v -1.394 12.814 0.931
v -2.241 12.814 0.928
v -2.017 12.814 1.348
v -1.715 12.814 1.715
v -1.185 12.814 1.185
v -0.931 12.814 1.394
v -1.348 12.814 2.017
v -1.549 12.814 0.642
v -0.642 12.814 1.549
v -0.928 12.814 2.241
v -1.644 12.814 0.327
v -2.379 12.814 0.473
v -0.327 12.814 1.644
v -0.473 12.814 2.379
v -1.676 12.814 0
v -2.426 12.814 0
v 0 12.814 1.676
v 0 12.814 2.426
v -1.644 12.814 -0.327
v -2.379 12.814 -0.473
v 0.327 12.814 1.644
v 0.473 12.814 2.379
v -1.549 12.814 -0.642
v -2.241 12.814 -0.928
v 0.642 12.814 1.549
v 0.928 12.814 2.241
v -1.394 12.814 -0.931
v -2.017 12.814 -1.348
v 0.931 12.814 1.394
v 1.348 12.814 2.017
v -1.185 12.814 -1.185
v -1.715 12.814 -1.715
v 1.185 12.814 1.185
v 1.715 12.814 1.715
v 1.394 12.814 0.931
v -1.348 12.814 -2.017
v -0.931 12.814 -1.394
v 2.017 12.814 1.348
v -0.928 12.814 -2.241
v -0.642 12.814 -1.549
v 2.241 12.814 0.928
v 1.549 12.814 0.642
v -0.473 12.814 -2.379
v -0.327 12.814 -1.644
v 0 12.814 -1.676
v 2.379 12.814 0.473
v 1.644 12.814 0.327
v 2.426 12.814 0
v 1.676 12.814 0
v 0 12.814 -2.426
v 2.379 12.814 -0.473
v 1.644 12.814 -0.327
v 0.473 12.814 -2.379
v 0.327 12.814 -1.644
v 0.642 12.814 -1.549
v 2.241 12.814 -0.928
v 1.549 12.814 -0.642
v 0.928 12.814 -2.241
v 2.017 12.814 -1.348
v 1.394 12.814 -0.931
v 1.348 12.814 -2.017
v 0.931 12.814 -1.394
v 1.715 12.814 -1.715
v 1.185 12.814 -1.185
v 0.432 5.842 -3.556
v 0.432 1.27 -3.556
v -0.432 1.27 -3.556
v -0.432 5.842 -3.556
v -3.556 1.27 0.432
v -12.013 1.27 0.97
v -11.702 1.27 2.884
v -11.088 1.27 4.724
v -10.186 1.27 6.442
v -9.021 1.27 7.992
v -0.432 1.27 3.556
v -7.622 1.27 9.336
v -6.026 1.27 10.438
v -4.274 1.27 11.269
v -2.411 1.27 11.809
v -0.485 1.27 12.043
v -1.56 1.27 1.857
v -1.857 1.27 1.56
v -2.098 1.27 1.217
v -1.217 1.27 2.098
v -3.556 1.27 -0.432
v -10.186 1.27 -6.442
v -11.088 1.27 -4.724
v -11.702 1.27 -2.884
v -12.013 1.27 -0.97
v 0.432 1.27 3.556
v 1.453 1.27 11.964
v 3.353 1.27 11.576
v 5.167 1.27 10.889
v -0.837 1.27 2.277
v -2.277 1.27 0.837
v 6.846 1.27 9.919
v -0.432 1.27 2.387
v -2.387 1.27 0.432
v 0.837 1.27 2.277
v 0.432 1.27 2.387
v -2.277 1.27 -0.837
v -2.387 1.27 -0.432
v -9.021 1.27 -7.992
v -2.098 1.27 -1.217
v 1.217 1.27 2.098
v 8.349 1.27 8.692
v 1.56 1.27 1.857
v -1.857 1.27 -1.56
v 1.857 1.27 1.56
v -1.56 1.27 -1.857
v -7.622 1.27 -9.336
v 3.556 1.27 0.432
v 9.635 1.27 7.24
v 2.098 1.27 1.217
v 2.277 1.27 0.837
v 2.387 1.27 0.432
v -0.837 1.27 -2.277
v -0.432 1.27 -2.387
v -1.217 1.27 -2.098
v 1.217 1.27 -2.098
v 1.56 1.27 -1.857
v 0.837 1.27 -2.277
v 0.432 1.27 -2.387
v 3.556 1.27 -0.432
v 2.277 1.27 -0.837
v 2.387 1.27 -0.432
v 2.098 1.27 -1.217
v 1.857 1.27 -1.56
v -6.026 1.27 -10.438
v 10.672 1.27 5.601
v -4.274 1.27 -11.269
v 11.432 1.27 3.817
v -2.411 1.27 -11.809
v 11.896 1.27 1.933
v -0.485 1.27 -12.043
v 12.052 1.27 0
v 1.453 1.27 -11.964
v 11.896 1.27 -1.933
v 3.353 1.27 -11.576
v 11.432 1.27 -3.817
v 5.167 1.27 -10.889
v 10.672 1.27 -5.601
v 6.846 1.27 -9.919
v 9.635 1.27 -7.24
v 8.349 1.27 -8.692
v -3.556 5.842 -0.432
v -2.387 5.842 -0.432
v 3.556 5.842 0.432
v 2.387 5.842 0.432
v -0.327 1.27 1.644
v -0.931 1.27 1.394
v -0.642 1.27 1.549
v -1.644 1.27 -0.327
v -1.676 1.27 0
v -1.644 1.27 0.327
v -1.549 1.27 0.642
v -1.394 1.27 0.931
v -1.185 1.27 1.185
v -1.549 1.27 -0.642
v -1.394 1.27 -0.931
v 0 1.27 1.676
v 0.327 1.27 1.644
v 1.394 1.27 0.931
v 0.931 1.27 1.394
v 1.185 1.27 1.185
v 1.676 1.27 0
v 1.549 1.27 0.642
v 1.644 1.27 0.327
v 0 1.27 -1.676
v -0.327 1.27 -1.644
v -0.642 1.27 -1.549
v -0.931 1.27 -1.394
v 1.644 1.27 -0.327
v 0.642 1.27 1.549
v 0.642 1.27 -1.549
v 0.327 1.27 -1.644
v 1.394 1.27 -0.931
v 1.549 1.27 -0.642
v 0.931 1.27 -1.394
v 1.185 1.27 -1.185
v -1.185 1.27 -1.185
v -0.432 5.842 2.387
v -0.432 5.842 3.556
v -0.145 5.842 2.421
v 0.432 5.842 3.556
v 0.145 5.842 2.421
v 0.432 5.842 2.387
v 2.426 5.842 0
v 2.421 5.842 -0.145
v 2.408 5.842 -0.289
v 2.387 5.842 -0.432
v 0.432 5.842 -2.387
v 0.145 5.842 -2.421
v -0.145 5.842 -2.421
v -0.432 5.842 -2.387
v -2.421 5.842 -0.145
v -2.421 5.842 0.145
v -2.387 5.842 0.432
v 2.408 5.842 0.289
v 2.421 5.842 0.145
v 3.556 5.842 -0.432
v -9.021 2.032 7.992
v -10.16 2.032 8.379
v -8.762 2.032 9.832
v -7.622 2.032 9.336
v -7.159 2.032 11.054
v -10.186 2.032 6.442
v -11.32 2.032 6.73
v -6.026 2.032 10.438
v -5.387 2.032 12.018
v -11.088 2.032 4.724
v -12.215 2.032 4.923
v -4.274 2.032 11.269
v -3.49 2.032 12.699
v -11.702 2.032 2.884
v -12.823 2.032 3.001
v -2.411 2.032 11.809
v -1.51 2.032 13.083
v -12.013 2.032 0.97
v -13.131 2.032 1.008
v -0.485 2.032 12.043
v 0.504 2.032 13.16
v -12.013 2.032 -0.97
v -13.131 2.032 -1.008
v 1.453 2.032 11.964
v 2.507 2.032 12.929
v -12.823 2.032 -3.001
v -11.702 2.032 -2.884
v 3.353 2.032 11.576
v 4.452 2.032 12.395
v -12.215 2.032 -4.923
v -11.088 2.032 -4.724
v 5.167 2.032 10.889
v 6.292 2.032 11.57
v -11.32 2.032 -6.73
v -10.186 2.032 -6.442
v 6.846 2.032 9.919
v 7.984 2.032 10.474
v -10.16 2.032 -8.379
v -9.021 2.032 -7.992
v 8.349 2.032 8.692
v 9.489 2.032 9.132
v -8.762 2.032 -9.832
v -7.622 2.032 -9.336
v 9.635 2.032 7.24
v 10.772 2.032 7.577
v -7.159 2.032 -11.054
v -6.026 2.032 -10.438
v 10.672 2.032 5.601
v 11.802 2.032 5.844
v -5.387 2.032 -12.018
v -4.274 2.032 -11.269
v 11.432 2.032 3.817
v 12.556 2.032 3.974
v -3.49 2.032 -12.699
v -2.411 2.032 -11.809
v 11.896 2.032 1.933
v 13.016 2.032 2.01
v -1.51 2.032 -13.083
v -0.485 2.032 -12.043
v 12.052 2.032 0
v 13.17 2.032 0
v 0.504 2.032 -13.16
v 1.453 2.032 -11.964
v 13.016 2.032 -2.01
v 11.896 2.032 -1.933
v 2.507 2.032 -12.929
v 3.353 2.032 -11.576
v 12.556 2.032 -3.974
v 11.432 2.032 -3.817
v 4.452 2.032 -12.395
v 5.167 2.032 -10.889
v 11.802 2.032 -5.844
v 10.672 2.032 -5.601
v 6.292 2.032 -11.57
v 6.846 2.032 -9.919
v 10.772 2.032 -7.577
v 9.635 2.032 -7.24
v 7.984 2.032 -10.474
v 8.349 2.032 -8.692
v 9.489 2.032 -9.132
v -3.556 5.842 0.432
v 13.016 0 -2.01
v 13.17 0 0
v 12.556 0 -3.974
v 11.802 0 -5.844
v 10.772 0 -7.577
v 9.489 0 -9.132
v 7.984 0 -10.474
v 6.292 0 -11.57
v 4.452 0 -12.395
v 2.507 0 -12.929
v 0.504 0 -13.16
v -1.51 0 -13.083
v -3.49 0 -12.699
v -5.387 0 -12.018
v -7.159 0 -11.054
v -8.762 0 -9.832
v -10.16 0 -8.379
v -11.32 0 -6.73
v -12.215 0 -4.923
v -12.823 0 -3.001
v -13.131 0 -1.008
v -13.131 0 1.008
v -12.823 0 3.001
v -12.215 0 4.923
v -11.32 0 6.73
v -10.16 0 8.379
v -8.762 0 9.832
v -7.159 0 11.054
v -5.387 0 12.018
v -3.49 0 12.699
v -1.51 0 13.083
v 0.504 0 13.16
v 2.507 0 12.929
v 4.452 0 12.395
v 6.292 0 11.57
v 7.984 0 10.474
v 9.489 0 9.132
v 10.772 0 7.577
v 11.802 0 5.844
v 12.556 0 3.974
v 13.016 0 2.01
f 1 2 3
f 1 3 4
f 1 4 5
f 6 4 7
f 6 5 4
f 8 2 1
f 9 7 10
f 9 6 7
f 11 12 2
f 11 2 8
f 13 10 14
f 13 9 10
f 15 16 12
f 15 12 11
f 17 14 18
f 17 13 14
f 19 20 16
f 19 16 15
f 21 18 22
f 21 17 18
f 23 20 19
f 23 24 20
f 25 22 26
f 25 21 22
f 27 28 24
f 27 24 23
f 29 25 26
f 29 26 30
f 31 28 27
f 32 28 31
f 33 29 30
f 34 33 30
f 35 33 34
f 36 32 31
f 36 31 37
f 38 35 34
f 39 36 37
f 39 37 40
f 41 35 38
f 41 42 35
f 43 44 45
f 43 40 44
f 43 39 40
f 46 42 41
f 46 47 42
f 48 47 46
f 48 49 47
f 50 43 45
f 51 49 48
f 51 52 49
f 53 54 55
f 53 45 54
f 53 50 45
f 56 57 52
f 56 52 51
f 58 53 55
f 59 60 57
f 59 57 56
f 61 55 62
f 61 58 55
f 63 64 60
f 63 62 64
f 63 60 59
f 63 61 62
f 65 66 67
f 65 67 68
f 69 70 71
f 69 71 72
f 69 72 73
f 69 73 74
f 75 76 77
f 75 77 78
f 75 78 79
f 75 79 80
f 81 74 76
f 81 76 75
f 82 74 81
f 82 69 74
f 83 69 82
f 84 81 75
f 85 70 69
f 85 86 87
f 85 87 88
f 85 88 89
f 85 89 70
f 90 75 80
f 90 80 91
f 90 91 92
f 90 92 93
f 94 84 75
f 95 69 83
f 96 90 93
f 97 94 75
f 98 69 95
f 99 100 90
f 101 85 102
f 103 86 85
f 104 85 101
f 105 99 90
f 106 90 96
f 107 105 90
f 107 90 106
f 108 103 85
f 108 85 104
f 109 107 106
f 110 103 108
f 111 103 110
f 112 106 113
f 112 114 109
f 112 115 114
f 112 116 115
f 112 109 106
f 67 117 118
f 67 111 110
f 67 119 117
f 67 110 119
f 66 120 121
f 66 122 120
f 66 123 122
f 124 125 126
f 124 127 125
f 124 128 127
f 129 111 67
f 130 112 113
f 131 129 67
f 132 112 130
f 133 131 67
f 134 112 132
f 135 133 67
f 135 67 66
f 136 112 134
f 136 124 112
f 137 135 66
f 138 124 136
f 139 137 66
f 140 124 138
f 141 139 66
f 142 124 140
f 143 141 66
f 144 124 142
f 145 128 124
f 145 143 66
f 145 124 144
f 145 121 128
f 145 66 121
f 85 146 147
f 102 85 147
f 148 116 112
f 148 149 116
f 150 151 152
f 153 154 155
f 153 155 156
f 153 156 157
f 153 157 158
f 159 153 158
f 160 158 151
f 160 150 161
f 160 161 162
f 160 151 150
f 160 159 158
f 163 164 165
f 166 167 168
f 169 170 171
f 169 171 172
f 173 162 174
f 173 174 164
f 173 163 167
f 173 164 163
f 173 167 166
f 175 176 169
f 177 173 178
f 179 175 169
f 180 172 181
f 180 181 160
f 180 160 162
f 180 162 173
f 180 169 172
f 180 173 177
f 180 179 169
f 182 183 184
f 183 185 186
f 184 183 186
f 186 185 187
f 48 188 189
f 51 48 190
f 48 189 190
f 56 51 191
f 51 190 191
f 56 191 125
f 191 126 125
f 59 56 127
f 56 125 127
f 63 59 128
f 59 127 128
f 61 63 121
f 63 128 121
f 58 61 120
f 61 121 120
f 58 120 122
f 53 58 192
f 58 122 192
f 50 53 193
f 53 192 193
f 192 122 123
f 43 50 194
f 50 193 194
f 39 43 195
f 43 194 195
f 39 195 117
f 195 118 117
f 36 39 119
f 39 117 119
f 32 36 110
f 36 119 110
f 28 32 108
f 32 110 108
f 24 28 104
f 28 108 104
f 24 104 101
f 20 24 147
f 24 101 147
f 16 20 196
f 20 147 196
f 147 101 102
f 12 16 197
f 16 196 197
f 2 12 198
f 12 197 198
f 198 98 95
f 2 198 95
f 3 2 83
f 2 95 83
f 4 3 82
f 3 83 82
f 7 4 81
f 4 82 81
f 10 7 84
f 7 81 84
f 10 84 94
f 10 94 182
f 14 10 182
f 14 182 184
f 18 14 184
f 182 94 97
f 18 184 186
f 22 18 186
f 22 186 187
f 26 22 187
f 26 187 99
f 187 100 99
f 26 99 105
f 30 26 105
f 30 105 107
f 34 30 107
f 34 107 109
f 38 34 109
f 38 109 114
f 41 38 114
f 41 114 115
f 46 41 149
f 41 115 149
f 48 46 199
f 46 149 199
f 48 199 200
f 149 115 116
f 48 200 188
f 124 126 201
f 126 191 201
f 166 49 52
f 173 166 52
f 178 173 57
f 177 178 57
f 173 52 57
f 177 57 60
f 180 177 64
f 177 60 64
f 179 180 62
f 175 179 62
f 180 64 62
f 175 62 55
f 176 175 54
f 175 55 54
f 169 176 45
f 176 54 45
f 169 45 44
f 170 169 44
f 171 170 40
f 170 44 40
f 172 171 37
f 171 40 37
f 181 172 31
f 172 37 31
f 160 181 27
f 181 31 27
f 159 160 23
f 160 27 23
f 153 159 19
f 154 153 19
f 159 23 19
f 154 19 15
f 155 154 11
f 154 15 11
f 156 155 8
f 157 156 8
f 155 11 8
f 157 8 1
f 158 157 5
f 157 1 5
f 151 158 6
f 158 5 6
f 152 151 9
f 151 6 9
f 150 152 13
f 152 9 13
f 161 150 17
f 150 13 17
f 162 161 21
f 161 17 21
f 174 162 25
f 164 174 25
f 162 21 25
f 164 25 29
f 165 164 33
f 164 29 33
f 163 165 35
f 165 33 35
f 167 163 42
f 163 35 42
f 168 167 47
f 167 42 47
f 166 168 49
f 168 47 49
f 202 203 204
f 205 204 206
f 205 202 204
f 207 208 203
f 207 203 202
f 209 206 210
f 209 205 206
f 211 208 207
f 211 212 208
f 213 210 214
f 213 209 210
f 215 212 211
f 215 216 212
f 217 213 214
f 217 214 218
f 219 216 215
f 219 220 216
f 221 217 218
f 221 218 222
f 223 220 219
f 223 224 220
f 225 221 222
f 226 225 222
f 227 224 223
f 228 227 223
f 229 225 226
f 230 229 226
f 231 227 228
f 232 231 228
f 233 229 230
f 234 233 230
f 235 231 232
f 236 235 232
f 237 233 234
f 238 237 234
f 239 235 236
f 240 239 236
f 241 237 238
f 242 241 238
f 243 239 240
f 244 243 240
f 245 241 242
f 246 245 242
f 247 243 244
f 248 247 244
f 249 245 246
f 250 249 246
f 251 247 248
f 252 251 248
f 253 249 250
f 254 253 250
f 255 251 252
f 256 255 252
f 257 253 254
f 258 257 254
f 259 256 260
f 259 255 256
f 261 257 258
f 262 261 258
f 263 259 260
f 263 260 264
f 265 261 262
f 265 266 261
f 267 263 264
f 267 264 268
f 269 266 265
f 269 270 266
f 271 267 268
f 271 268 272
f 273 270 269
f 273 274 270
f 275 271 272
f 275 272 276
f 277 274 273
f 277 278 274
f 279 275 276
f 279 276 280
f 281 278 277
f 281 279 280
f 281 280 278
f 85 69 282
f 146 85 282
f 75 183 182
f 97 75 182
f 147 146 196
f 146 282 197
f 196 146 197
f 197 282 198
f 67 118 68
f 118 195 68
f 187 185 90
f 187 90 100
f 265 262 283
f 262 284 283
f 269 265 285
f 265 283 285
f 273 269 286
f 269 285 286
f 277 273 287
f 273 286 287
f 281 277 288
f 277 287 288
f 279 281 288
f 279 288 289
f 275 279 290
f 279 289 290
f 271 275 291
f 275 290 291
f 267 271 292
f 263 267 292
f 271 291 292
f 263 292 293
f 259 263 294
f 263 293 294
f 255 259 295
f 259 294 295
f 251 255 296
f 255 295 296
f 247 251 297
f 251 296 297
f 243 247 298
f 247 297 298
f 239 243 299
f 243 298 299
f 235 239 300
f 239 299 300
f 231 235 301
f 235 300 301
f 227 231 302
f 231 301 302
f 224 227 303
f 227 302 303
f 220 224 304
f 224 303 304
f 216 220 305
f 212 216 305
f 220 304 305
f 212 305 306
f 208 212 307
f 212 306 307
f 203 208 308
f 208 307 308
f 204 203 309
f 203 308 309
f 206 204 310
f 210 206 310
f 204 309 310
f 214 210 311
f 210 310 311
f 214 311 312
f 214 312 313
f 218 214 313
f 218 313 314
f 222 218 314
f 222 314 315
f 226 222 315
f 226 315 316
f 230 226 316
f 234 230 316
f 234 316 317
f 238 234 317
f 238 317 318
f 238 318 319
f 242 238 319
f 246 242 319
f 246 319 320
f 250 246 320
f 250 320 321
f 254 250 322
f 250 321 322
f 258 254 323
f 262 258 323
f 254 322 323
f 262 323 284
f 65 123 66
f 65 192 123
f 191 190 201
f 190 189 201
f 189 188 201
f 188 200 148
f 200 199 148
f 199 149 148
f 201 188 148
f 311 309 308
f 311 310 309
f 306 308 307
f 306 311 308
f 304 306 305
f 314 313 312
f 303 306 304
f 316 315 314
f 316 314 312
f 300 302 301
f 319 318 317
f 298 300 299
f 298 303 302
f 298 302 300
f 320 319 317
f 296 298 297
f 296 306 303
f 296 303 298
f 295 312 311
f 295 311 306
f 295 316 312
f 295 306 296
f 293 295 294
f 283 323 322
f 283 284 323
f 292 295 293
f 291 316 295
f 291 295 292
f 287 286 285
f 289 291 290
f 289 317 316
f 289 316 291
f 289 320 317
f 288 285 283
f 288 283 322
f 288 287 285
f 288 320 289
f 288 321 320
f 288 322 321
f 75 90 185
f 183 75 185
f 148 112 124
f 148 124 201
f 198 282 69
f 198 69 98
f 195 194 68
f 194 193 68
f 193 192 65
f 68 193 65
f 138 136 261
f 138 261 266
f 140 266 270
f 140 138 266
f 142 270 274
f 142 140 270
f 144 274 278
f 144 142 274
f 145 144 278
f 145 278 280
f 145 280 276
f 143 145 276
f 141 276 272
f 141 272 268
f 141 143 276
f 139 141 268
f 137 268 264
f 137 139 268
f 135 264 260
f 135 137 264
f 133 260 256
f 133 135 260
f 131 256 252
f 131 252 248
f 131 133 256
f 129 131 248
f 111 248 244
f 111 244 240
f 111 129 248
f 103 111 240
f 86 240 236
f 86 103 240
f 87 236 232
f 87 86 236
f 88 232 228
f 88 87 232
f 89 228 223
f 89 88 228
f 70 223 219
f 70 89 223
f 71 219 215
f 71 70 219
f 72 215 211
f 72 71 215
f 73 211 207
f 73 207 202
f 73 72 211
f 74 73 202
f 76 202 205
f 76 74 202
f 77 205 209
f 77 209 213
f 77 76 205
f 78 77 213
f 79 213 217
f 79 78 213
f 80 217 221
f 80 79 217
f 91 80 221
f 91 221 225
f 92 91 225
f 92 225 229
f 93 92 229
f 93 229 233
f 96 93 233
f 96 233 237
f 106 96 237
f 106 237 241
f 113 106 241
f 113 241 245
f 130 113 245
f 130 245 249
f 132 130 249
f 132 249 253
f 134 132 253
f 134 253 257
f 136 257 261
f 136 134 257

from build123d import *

# Parameters (mm, degrees)
SKETCH1_R           = 13.1699
BOSS_EXTRUDE1_DEPTH = 1.27
SKETCH2_R           = 13.1699
SKETCH2_R_2         = 12.0523
BOSS_EXTRUDE2_DEPTH = 0.762
SKETCH3_R           = 2.4257
BOSS_EXTRUDE3_DEPTH = 11.5443
SKETCH6_W           = 7.112
SKETCH6_H           = 5.842
BOSS_EXTRUDE4_DEPTH = 0.4318
SKETCH7_W           = 7.112
SKETCH7_H           = 5.842
BOSS_EXTRUDE5_DEPTH = 0.4318
SKETCH4_R           = 1.6764
CUT_EXTRUDE1_DEPTH  = 11.5443


with BuildPart() as part:
    # Sketch1 → Boss-Extrude1 (new body)
    with BuildSketch(Plane(origin=(0, 0, 0), x_dir=(1, 0, 0), z_dir=(0, 1, 0))):
        Circle(SKETCH1_R)
    extrude(amount=BOSS_EXTRUDE1_DEPTH)

    # Sketch2 → Boss-Extrude2 (add)
    with BuildSketch(Plane(origin=(0, 1.27, 0), x_dir=(1, 0, 0), z_dir=(0, 1, 0))):
        Circle(SKETCH2_R)
        Circle(SKETCH2_R_2, mode=Mode.SUBTRACT)
    extrude(amount=BOSS_EXTRUDE2_DEPTH)

    # Sketch3 → Boss-Extrude3 (add)
    with BuildSketch(Plane(origin=(0, 1.27, 0), x_dir=(1, 0, 0), z_dir=(0, 1, 0))):
        Circle(SKETCH3_R)
    extrude(amount=BOSS_EXTRUDE3_DEPTH)

    # Sketch6 → Boss-Extrude4 (add, symmetric)
    with BuildSketch(Plane.XY):
        with Locations((0, 2.921)):
            Rectangle(SKETCH6_W, SKETCH6_H)
    extrude(amount=BOSS_EXTRUDE4_DEPTH, both=True)

    # Sketch7 → Boss-Extrude5 (add, symmetric)
    with BuildSketch(Plane(origin=(0, 0, 0), x_dir=(0, 0, -1), z_dir=(1, 0, 0))):
        with Locations((0, 2.921)):
            Rectangle(SKETCH7_W, SKETCH7_H)
    extrude(amount=BOSS_EXTRUDE5_DEPTH, both=True)

    # Sketch4 → Cut-Extrude1 (cut)
    with BuildSketch(Plane(origin=(0, 12.8143, 0), x_dir=(1, 0, 0), z_dir=(0, 1, 0))):
        Circle(SKETCH4_R)
    extrude(amount=-CUT_EXTRUDE1_DEPTH, mode=Mode.SUBTRACT)


solid = part.part
